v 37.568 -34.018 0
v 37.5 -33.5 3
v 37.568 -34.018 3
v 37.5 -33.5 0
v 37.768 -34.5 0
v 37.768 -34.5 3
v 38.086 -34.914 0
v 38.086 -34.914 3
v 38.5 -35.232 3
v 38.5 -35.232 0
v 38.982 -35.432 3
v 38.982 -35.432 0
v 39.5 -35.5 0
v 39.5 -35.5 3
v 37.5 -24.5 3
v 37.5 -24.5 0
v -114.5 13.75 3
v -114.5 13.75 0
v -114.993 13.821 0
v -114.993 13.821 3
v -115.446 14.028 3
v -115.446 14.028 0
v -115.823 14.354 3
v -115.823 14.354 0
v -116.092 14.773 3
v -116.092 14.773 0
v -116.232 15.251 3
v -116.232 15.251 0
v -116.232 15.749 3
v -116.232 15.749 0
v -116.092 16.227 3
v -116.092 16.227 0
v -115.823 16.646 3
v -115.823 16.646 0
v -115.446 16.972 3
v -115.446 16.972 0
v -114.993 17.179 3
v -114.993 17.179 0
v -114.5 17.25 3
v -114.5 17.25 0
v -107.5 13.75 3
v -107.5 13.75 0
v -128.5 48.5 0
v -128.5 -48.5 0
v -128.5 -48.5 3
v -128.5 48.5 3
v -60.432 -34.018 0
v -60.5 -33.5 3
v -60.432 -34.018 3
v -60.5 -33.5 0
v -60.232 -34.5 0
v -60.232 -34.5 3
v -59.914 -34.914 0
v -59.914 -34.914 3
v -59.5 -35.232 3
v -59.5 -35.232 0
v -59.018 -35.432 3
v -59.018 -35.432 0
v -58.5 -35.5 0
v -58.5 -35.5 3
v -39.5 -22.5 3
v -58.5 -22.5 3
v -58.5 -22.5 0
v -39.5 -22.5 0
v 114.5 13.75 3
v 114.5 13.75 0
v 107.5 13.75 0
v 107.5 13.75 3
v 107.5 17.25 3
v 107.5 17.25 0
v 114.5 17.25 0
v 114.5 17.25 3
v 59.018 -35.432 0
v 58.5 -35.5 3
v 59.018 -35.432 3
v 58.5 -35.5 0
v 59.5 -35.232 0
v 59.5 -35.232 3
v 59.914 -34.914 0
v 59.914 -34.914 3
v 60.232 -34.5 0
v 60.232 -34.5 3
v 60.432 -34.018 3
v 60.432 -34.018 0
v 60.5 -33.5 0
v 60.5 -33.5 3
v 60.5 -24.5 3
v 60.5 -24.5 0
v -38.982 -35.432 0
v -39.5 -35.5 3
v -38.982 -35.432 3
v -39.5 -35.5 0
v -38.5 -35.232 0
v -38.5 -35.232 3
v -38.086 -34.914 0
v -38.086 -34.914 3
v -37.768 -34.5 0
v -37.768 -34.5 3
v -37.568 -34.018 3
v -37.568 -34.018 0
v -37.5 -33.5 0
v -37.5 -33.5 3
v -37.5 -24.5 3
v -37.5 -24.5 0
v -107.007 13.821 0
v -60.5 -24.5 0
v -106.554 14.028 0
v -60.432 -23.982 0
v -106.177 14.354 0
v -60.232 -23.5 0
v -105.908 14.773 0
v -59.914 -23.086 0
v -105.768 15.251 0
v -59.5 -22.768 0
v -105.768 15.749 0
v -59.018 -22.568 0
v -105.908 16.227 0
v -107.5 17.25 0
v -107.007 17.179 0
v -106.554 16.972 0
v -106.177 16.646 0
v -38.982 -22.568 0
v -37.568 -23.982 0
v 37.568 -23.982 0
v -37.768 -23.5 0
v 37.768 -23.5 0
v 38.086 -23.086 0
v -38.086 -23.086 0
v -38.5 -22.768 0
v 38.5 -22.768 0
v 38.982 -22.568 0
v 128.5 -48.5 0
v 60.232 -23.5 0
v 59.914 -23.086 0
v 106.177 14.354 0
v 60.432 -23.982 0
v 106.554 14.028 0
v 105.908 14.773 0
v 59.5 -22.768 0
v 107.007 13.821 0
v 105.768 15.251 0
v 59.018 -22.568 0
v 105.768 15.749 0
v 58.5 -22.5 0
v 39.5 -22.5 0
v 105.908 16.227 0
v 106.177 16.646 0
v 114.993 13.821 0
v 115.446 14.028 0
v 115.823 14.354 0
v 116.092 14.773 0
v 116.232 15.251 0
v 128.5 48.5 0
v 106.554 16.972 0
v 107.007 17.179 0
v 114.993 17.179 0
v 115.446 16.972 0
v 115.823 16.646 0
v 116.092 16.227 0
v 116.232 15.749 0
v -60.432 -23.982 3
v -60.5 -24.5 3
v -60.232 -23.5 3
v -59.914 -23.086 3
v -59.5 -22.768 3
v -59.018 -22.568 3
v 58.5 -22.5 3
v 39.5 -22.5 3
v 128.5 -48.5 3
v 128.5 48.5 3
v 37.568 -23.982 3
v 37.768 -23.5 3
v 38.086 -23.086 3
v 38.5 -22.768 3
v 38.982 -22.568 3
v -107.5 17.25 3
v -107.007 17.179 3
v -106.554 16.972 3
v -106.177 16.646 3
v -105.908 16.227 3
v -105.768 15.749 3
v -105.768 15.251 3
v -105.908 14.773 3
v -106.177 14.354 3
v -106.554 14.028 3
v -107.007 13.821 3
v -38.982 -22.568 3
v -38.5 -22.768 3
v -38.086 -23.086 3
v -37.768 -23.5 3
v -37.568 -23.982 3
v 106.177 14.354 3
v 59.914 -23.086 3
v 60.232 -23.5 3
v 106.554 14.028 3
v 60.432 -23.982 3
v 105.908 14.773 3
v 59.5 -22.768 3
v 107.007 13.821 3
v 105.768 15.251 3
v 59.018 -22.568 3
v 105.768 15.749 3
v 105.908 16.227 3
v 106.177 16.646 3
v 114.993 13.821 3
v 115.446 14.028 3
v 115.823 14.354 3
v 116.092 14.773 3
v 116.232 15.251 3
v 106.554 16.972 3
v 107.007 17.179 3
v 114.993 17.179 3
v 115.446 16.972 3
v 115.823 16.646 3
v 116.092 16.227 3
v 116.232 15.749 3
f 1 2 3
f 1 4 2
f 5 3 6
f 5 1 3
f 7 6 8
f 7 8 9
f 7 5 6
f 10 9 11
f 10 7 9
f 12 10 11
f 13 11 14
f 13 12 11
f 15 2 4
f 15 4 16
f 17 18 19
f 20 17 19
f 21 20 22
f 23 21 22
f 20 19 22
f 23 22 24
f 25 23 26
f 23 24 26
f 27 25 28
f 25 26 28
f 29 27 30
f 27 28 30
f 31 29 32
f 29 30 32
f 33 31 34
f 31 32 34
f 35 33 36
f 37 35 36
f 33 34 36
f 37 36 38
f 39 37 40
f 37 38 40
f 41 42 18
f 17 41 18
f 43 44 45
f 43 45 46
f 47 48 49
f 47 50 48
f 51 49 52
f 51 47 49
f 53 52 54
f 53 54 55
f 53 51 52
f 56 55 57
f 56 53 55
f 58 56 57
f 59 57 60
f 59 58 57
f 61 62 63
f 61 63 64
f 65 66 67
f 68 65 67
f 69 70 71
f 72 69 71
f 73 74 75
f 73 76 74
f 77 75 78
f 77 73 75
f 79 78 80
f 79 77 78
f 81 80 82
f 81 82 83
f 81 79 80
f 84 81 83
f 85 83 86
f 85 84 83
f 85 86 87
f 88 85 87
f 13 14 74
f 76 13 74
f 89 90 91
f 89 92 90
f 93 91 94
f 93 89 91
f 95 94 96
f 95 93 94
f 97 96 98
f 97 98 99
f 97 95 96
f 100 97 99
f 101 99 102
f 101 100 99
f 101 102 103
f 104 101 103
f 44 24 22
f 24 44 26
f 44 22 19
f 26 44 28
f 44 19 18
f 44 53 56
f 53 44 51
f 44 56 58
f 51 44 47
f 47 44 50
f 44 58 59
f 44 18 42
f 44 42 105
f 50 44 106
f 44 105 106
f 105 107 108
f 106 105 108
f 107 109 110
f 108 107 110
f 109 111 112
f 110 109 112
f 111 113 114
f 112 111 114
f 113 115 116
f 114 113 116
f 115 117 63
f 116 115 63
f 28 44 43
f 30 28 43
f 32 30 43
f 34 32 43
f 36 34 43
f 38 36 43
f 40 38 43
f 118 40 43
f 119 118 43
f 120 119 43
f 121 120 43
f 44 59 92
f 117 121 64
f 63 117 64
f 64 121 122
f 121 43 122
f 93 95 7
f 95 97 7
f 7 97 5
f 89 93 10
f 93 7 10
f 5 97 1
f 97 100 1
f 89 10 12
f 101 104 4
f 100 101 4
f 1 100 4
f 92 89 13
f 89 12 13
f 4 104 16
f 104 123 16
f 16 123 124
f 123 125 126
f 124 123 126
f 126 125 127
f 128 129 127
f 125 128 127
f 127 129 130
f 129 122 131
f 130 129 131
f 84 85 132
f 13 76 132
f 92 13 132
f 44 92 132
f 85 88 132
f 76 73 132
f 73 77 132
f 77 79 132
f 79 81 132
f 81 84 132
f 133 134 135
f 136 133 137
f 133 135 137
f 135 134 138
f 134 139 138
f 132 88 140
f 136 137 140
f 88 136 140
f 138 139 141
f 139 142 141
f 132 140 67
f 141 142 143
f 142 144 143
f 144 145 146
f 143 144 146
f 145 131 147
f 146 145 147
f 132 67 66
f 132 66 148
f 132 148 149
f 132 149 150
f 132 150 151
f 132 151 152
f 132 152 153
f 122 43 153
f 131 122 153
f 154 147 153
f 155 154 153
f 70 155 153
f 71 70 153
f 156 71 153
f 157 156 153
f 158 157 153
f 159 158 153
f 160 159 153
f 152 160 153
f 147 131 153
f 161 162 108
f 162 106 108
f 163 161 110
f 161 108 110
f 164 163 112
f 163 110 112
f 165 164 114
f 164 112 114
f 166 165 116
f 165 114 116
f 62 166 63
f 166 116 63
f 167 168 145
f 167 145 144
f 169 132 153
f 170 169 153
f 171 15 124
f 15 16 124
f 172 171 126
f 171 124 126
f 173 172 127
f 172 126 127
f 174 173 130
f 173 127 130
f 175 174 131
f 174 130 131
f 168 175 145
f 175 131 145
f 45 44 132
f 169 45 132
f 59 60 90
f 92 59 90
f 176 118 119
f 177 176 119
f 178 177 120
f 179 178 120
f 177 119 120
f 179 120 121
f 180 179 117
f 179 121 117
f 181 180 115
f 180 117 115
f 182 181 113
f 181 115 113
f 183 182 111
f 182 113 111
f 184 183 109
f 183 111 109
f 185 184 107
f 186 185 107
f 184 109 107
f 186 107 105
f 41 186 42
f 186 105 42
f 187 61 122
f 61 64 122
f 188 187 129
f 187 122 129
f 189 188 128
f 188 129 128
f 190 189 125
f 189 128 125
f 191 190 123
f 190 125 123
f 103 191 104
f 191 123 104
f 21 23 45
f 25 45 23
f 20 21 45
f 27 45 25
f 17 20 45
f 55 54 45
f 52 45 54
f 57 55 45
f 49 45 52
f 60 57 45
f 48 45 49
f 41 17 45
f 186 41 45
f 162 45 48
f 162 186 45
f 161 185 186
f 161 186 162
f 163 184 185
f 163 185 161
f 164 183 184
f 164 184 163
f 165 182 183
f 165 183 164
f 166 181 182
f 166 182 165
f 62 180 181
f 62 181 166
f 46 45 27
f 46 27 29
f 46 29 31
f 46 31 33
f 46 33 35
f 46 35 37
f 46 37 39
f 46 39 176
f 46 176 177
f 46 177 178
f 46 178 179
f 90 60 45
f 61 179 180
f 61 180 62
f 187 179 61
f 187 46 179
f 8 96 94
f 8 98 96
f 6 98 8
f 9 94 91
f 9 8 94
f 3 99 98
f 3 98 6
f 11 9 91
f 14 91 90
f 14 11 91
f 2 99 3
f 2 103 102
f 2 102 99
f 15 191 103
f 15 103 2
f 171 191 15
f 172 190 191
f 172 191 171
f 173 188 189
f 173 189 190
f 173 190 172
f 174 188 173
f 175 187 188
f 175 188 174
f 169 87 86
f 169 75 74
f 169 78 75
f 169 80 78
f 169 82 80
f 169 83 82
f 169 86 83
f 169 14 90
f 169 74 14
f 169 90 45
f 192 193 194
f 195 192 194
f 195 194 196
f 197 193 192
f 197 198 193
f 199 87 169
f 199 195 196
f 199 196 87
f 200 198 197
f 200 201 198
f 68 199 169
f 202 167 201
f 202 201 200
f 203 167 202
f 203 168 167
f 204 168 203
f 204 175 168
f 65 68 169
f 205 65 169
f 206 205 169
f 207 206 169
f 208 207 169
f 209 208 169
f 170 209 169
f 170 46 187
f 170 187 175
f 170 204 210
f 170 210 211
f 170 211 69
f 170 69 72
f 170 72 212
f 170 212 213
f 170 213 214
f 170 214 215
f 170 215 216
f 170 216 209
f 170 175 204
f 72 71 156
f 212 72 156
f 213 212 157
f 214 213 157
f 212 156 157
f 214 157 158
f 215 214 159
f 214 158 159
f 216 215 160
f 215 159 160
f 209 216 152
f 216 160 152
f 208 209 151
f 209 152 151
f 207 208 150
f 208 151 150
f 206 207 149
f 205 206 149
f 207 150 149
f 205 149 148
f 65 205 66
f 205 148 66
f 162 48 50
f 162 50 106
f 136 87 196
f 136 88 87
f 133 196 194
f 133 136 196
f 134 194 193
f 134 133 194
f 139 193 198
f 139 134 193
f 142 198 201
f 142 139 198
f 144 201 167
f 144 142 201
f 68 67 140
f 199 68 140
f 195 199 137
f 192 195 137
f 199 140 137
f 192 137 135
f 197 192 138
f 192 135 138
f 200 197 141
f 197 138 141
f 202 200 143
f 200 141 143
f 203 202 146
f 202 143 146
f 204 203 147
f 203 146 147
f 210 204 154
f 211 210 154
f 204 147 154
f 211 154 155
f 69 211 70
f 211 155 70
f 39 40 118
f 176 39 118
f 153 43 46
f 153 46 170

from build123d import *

# Parameters (mm, degrees)
ESQUISSE1_W             = 257
ESQUISSE1_H             = 97
BOSS_EXTRU_1_DEPTH      = 3
ENL_V_MAT_EXTRU_1_REACH = 5
ESQUISSE2_W             = 23
ESQUISSE2_H             = 13
CONG_1_R                = 2


with BuildPart() as part:
    # Esquisse1 → Boss.-Extru.1 (new body)
    with BuildSketch(Plane.XY):
        Rectangle(ESQUISSE1_W, ESQUISSE1_H)
        with BuildLine():
            Line((-114.5, 17.25), (-107.5, 17.25))
            ThreePointArc((-107.5, 17.25), (-105.75, 15.5), (-107.5, 13.75))
            Line((-107.5, 13.75), (-114.5, 13.75))
            ThreePointArc((-114.5, 13.75), (-116.25, 15.5), (-114.5, 17.25))
        make_face(mode=Mode.SUBTRACT)
        with BuildLine():
            Line((107.5, 17.25), (114.5, 17.25))
            ThreePointArc((114.5, 17.25), (116.25, 15.5), (114.5, 13.75))
            Line((114.5, 13.75), (107.5, 13.75))
            ThreePointArc((107.5, 13.75), (105.75, 15.5), (107.5, 17.25))
        make_face(mode=Mode.SUBTRACT)
    extrude(amount=BOSS_EXTRU_1_DEPTH)

    # Esquisse2 → Enlèv. mat.-Extru.1 (cut, up to next)
    with BuildSketch(Plane.XY.offset(3), mode=Mode.PRIVATE) as enl_v_mat_extru_1_sk1:
        with Locations((-49, -29)):
            Rectangle(ESQUISSE2_W, ESQUISSE2_H)
    enl_v_mat_extru_1_tool1 = extrude(enl_v_mat_extru_1_sk1.sketch, amount=-ENL_V_MAT_EXTRU_1_REACH, mode=Mode.PRIVATE) & part.part
    add(enl_v_mat_extru_1_tool1.solids().sort_by_distance((-49, -29, 3))[0], mode=Mode.SUBTRACT)
    # Esquisse2 → Enlèv. mat.-Extru.1 (cut, up to next)
    with BuildSketch(Plane.XY.offset(3), mode=Mode.PRIVATE) as enl_v_mat_extru_1_sk2:
        with Locations((49, -29)):
            Rectangle(ESQUISSE2_W, ESQUISSE2_H)
    enl_v_mat_extru_1_tool2 = extrude(enl_v_mat_extru_1_sk2.sketch, amount=-ENL_V_MAT_EXTRU_1_REACH, mode=Mode.PRIVATE) & part.part
    add(enl_v_mat_extru_1_tool2.solids().sort_by_distance((49, -29, 3))[0], mode=Mode.SUBTRACT)

    # Congé1
    cong_1_edges = [part.edges().sort_by_distance(p)[0] for p in [
        (-60.5, -35.5, 1.5),
        (-60.5, -22.5, 1.5),
        (-37.5, -22.5, 1.5),
        (-37.5, -35.5, 1.5),
        (37.5, -35.5, 1.5),
        (37.5, -22.5, 1.5),
        (60.5, -22.5, 1.5),
        (60.5, -35.5, 1.5),
    ]]
    fillet(cong_1_edges, radius=CONG_1_R)


solid = part.part
